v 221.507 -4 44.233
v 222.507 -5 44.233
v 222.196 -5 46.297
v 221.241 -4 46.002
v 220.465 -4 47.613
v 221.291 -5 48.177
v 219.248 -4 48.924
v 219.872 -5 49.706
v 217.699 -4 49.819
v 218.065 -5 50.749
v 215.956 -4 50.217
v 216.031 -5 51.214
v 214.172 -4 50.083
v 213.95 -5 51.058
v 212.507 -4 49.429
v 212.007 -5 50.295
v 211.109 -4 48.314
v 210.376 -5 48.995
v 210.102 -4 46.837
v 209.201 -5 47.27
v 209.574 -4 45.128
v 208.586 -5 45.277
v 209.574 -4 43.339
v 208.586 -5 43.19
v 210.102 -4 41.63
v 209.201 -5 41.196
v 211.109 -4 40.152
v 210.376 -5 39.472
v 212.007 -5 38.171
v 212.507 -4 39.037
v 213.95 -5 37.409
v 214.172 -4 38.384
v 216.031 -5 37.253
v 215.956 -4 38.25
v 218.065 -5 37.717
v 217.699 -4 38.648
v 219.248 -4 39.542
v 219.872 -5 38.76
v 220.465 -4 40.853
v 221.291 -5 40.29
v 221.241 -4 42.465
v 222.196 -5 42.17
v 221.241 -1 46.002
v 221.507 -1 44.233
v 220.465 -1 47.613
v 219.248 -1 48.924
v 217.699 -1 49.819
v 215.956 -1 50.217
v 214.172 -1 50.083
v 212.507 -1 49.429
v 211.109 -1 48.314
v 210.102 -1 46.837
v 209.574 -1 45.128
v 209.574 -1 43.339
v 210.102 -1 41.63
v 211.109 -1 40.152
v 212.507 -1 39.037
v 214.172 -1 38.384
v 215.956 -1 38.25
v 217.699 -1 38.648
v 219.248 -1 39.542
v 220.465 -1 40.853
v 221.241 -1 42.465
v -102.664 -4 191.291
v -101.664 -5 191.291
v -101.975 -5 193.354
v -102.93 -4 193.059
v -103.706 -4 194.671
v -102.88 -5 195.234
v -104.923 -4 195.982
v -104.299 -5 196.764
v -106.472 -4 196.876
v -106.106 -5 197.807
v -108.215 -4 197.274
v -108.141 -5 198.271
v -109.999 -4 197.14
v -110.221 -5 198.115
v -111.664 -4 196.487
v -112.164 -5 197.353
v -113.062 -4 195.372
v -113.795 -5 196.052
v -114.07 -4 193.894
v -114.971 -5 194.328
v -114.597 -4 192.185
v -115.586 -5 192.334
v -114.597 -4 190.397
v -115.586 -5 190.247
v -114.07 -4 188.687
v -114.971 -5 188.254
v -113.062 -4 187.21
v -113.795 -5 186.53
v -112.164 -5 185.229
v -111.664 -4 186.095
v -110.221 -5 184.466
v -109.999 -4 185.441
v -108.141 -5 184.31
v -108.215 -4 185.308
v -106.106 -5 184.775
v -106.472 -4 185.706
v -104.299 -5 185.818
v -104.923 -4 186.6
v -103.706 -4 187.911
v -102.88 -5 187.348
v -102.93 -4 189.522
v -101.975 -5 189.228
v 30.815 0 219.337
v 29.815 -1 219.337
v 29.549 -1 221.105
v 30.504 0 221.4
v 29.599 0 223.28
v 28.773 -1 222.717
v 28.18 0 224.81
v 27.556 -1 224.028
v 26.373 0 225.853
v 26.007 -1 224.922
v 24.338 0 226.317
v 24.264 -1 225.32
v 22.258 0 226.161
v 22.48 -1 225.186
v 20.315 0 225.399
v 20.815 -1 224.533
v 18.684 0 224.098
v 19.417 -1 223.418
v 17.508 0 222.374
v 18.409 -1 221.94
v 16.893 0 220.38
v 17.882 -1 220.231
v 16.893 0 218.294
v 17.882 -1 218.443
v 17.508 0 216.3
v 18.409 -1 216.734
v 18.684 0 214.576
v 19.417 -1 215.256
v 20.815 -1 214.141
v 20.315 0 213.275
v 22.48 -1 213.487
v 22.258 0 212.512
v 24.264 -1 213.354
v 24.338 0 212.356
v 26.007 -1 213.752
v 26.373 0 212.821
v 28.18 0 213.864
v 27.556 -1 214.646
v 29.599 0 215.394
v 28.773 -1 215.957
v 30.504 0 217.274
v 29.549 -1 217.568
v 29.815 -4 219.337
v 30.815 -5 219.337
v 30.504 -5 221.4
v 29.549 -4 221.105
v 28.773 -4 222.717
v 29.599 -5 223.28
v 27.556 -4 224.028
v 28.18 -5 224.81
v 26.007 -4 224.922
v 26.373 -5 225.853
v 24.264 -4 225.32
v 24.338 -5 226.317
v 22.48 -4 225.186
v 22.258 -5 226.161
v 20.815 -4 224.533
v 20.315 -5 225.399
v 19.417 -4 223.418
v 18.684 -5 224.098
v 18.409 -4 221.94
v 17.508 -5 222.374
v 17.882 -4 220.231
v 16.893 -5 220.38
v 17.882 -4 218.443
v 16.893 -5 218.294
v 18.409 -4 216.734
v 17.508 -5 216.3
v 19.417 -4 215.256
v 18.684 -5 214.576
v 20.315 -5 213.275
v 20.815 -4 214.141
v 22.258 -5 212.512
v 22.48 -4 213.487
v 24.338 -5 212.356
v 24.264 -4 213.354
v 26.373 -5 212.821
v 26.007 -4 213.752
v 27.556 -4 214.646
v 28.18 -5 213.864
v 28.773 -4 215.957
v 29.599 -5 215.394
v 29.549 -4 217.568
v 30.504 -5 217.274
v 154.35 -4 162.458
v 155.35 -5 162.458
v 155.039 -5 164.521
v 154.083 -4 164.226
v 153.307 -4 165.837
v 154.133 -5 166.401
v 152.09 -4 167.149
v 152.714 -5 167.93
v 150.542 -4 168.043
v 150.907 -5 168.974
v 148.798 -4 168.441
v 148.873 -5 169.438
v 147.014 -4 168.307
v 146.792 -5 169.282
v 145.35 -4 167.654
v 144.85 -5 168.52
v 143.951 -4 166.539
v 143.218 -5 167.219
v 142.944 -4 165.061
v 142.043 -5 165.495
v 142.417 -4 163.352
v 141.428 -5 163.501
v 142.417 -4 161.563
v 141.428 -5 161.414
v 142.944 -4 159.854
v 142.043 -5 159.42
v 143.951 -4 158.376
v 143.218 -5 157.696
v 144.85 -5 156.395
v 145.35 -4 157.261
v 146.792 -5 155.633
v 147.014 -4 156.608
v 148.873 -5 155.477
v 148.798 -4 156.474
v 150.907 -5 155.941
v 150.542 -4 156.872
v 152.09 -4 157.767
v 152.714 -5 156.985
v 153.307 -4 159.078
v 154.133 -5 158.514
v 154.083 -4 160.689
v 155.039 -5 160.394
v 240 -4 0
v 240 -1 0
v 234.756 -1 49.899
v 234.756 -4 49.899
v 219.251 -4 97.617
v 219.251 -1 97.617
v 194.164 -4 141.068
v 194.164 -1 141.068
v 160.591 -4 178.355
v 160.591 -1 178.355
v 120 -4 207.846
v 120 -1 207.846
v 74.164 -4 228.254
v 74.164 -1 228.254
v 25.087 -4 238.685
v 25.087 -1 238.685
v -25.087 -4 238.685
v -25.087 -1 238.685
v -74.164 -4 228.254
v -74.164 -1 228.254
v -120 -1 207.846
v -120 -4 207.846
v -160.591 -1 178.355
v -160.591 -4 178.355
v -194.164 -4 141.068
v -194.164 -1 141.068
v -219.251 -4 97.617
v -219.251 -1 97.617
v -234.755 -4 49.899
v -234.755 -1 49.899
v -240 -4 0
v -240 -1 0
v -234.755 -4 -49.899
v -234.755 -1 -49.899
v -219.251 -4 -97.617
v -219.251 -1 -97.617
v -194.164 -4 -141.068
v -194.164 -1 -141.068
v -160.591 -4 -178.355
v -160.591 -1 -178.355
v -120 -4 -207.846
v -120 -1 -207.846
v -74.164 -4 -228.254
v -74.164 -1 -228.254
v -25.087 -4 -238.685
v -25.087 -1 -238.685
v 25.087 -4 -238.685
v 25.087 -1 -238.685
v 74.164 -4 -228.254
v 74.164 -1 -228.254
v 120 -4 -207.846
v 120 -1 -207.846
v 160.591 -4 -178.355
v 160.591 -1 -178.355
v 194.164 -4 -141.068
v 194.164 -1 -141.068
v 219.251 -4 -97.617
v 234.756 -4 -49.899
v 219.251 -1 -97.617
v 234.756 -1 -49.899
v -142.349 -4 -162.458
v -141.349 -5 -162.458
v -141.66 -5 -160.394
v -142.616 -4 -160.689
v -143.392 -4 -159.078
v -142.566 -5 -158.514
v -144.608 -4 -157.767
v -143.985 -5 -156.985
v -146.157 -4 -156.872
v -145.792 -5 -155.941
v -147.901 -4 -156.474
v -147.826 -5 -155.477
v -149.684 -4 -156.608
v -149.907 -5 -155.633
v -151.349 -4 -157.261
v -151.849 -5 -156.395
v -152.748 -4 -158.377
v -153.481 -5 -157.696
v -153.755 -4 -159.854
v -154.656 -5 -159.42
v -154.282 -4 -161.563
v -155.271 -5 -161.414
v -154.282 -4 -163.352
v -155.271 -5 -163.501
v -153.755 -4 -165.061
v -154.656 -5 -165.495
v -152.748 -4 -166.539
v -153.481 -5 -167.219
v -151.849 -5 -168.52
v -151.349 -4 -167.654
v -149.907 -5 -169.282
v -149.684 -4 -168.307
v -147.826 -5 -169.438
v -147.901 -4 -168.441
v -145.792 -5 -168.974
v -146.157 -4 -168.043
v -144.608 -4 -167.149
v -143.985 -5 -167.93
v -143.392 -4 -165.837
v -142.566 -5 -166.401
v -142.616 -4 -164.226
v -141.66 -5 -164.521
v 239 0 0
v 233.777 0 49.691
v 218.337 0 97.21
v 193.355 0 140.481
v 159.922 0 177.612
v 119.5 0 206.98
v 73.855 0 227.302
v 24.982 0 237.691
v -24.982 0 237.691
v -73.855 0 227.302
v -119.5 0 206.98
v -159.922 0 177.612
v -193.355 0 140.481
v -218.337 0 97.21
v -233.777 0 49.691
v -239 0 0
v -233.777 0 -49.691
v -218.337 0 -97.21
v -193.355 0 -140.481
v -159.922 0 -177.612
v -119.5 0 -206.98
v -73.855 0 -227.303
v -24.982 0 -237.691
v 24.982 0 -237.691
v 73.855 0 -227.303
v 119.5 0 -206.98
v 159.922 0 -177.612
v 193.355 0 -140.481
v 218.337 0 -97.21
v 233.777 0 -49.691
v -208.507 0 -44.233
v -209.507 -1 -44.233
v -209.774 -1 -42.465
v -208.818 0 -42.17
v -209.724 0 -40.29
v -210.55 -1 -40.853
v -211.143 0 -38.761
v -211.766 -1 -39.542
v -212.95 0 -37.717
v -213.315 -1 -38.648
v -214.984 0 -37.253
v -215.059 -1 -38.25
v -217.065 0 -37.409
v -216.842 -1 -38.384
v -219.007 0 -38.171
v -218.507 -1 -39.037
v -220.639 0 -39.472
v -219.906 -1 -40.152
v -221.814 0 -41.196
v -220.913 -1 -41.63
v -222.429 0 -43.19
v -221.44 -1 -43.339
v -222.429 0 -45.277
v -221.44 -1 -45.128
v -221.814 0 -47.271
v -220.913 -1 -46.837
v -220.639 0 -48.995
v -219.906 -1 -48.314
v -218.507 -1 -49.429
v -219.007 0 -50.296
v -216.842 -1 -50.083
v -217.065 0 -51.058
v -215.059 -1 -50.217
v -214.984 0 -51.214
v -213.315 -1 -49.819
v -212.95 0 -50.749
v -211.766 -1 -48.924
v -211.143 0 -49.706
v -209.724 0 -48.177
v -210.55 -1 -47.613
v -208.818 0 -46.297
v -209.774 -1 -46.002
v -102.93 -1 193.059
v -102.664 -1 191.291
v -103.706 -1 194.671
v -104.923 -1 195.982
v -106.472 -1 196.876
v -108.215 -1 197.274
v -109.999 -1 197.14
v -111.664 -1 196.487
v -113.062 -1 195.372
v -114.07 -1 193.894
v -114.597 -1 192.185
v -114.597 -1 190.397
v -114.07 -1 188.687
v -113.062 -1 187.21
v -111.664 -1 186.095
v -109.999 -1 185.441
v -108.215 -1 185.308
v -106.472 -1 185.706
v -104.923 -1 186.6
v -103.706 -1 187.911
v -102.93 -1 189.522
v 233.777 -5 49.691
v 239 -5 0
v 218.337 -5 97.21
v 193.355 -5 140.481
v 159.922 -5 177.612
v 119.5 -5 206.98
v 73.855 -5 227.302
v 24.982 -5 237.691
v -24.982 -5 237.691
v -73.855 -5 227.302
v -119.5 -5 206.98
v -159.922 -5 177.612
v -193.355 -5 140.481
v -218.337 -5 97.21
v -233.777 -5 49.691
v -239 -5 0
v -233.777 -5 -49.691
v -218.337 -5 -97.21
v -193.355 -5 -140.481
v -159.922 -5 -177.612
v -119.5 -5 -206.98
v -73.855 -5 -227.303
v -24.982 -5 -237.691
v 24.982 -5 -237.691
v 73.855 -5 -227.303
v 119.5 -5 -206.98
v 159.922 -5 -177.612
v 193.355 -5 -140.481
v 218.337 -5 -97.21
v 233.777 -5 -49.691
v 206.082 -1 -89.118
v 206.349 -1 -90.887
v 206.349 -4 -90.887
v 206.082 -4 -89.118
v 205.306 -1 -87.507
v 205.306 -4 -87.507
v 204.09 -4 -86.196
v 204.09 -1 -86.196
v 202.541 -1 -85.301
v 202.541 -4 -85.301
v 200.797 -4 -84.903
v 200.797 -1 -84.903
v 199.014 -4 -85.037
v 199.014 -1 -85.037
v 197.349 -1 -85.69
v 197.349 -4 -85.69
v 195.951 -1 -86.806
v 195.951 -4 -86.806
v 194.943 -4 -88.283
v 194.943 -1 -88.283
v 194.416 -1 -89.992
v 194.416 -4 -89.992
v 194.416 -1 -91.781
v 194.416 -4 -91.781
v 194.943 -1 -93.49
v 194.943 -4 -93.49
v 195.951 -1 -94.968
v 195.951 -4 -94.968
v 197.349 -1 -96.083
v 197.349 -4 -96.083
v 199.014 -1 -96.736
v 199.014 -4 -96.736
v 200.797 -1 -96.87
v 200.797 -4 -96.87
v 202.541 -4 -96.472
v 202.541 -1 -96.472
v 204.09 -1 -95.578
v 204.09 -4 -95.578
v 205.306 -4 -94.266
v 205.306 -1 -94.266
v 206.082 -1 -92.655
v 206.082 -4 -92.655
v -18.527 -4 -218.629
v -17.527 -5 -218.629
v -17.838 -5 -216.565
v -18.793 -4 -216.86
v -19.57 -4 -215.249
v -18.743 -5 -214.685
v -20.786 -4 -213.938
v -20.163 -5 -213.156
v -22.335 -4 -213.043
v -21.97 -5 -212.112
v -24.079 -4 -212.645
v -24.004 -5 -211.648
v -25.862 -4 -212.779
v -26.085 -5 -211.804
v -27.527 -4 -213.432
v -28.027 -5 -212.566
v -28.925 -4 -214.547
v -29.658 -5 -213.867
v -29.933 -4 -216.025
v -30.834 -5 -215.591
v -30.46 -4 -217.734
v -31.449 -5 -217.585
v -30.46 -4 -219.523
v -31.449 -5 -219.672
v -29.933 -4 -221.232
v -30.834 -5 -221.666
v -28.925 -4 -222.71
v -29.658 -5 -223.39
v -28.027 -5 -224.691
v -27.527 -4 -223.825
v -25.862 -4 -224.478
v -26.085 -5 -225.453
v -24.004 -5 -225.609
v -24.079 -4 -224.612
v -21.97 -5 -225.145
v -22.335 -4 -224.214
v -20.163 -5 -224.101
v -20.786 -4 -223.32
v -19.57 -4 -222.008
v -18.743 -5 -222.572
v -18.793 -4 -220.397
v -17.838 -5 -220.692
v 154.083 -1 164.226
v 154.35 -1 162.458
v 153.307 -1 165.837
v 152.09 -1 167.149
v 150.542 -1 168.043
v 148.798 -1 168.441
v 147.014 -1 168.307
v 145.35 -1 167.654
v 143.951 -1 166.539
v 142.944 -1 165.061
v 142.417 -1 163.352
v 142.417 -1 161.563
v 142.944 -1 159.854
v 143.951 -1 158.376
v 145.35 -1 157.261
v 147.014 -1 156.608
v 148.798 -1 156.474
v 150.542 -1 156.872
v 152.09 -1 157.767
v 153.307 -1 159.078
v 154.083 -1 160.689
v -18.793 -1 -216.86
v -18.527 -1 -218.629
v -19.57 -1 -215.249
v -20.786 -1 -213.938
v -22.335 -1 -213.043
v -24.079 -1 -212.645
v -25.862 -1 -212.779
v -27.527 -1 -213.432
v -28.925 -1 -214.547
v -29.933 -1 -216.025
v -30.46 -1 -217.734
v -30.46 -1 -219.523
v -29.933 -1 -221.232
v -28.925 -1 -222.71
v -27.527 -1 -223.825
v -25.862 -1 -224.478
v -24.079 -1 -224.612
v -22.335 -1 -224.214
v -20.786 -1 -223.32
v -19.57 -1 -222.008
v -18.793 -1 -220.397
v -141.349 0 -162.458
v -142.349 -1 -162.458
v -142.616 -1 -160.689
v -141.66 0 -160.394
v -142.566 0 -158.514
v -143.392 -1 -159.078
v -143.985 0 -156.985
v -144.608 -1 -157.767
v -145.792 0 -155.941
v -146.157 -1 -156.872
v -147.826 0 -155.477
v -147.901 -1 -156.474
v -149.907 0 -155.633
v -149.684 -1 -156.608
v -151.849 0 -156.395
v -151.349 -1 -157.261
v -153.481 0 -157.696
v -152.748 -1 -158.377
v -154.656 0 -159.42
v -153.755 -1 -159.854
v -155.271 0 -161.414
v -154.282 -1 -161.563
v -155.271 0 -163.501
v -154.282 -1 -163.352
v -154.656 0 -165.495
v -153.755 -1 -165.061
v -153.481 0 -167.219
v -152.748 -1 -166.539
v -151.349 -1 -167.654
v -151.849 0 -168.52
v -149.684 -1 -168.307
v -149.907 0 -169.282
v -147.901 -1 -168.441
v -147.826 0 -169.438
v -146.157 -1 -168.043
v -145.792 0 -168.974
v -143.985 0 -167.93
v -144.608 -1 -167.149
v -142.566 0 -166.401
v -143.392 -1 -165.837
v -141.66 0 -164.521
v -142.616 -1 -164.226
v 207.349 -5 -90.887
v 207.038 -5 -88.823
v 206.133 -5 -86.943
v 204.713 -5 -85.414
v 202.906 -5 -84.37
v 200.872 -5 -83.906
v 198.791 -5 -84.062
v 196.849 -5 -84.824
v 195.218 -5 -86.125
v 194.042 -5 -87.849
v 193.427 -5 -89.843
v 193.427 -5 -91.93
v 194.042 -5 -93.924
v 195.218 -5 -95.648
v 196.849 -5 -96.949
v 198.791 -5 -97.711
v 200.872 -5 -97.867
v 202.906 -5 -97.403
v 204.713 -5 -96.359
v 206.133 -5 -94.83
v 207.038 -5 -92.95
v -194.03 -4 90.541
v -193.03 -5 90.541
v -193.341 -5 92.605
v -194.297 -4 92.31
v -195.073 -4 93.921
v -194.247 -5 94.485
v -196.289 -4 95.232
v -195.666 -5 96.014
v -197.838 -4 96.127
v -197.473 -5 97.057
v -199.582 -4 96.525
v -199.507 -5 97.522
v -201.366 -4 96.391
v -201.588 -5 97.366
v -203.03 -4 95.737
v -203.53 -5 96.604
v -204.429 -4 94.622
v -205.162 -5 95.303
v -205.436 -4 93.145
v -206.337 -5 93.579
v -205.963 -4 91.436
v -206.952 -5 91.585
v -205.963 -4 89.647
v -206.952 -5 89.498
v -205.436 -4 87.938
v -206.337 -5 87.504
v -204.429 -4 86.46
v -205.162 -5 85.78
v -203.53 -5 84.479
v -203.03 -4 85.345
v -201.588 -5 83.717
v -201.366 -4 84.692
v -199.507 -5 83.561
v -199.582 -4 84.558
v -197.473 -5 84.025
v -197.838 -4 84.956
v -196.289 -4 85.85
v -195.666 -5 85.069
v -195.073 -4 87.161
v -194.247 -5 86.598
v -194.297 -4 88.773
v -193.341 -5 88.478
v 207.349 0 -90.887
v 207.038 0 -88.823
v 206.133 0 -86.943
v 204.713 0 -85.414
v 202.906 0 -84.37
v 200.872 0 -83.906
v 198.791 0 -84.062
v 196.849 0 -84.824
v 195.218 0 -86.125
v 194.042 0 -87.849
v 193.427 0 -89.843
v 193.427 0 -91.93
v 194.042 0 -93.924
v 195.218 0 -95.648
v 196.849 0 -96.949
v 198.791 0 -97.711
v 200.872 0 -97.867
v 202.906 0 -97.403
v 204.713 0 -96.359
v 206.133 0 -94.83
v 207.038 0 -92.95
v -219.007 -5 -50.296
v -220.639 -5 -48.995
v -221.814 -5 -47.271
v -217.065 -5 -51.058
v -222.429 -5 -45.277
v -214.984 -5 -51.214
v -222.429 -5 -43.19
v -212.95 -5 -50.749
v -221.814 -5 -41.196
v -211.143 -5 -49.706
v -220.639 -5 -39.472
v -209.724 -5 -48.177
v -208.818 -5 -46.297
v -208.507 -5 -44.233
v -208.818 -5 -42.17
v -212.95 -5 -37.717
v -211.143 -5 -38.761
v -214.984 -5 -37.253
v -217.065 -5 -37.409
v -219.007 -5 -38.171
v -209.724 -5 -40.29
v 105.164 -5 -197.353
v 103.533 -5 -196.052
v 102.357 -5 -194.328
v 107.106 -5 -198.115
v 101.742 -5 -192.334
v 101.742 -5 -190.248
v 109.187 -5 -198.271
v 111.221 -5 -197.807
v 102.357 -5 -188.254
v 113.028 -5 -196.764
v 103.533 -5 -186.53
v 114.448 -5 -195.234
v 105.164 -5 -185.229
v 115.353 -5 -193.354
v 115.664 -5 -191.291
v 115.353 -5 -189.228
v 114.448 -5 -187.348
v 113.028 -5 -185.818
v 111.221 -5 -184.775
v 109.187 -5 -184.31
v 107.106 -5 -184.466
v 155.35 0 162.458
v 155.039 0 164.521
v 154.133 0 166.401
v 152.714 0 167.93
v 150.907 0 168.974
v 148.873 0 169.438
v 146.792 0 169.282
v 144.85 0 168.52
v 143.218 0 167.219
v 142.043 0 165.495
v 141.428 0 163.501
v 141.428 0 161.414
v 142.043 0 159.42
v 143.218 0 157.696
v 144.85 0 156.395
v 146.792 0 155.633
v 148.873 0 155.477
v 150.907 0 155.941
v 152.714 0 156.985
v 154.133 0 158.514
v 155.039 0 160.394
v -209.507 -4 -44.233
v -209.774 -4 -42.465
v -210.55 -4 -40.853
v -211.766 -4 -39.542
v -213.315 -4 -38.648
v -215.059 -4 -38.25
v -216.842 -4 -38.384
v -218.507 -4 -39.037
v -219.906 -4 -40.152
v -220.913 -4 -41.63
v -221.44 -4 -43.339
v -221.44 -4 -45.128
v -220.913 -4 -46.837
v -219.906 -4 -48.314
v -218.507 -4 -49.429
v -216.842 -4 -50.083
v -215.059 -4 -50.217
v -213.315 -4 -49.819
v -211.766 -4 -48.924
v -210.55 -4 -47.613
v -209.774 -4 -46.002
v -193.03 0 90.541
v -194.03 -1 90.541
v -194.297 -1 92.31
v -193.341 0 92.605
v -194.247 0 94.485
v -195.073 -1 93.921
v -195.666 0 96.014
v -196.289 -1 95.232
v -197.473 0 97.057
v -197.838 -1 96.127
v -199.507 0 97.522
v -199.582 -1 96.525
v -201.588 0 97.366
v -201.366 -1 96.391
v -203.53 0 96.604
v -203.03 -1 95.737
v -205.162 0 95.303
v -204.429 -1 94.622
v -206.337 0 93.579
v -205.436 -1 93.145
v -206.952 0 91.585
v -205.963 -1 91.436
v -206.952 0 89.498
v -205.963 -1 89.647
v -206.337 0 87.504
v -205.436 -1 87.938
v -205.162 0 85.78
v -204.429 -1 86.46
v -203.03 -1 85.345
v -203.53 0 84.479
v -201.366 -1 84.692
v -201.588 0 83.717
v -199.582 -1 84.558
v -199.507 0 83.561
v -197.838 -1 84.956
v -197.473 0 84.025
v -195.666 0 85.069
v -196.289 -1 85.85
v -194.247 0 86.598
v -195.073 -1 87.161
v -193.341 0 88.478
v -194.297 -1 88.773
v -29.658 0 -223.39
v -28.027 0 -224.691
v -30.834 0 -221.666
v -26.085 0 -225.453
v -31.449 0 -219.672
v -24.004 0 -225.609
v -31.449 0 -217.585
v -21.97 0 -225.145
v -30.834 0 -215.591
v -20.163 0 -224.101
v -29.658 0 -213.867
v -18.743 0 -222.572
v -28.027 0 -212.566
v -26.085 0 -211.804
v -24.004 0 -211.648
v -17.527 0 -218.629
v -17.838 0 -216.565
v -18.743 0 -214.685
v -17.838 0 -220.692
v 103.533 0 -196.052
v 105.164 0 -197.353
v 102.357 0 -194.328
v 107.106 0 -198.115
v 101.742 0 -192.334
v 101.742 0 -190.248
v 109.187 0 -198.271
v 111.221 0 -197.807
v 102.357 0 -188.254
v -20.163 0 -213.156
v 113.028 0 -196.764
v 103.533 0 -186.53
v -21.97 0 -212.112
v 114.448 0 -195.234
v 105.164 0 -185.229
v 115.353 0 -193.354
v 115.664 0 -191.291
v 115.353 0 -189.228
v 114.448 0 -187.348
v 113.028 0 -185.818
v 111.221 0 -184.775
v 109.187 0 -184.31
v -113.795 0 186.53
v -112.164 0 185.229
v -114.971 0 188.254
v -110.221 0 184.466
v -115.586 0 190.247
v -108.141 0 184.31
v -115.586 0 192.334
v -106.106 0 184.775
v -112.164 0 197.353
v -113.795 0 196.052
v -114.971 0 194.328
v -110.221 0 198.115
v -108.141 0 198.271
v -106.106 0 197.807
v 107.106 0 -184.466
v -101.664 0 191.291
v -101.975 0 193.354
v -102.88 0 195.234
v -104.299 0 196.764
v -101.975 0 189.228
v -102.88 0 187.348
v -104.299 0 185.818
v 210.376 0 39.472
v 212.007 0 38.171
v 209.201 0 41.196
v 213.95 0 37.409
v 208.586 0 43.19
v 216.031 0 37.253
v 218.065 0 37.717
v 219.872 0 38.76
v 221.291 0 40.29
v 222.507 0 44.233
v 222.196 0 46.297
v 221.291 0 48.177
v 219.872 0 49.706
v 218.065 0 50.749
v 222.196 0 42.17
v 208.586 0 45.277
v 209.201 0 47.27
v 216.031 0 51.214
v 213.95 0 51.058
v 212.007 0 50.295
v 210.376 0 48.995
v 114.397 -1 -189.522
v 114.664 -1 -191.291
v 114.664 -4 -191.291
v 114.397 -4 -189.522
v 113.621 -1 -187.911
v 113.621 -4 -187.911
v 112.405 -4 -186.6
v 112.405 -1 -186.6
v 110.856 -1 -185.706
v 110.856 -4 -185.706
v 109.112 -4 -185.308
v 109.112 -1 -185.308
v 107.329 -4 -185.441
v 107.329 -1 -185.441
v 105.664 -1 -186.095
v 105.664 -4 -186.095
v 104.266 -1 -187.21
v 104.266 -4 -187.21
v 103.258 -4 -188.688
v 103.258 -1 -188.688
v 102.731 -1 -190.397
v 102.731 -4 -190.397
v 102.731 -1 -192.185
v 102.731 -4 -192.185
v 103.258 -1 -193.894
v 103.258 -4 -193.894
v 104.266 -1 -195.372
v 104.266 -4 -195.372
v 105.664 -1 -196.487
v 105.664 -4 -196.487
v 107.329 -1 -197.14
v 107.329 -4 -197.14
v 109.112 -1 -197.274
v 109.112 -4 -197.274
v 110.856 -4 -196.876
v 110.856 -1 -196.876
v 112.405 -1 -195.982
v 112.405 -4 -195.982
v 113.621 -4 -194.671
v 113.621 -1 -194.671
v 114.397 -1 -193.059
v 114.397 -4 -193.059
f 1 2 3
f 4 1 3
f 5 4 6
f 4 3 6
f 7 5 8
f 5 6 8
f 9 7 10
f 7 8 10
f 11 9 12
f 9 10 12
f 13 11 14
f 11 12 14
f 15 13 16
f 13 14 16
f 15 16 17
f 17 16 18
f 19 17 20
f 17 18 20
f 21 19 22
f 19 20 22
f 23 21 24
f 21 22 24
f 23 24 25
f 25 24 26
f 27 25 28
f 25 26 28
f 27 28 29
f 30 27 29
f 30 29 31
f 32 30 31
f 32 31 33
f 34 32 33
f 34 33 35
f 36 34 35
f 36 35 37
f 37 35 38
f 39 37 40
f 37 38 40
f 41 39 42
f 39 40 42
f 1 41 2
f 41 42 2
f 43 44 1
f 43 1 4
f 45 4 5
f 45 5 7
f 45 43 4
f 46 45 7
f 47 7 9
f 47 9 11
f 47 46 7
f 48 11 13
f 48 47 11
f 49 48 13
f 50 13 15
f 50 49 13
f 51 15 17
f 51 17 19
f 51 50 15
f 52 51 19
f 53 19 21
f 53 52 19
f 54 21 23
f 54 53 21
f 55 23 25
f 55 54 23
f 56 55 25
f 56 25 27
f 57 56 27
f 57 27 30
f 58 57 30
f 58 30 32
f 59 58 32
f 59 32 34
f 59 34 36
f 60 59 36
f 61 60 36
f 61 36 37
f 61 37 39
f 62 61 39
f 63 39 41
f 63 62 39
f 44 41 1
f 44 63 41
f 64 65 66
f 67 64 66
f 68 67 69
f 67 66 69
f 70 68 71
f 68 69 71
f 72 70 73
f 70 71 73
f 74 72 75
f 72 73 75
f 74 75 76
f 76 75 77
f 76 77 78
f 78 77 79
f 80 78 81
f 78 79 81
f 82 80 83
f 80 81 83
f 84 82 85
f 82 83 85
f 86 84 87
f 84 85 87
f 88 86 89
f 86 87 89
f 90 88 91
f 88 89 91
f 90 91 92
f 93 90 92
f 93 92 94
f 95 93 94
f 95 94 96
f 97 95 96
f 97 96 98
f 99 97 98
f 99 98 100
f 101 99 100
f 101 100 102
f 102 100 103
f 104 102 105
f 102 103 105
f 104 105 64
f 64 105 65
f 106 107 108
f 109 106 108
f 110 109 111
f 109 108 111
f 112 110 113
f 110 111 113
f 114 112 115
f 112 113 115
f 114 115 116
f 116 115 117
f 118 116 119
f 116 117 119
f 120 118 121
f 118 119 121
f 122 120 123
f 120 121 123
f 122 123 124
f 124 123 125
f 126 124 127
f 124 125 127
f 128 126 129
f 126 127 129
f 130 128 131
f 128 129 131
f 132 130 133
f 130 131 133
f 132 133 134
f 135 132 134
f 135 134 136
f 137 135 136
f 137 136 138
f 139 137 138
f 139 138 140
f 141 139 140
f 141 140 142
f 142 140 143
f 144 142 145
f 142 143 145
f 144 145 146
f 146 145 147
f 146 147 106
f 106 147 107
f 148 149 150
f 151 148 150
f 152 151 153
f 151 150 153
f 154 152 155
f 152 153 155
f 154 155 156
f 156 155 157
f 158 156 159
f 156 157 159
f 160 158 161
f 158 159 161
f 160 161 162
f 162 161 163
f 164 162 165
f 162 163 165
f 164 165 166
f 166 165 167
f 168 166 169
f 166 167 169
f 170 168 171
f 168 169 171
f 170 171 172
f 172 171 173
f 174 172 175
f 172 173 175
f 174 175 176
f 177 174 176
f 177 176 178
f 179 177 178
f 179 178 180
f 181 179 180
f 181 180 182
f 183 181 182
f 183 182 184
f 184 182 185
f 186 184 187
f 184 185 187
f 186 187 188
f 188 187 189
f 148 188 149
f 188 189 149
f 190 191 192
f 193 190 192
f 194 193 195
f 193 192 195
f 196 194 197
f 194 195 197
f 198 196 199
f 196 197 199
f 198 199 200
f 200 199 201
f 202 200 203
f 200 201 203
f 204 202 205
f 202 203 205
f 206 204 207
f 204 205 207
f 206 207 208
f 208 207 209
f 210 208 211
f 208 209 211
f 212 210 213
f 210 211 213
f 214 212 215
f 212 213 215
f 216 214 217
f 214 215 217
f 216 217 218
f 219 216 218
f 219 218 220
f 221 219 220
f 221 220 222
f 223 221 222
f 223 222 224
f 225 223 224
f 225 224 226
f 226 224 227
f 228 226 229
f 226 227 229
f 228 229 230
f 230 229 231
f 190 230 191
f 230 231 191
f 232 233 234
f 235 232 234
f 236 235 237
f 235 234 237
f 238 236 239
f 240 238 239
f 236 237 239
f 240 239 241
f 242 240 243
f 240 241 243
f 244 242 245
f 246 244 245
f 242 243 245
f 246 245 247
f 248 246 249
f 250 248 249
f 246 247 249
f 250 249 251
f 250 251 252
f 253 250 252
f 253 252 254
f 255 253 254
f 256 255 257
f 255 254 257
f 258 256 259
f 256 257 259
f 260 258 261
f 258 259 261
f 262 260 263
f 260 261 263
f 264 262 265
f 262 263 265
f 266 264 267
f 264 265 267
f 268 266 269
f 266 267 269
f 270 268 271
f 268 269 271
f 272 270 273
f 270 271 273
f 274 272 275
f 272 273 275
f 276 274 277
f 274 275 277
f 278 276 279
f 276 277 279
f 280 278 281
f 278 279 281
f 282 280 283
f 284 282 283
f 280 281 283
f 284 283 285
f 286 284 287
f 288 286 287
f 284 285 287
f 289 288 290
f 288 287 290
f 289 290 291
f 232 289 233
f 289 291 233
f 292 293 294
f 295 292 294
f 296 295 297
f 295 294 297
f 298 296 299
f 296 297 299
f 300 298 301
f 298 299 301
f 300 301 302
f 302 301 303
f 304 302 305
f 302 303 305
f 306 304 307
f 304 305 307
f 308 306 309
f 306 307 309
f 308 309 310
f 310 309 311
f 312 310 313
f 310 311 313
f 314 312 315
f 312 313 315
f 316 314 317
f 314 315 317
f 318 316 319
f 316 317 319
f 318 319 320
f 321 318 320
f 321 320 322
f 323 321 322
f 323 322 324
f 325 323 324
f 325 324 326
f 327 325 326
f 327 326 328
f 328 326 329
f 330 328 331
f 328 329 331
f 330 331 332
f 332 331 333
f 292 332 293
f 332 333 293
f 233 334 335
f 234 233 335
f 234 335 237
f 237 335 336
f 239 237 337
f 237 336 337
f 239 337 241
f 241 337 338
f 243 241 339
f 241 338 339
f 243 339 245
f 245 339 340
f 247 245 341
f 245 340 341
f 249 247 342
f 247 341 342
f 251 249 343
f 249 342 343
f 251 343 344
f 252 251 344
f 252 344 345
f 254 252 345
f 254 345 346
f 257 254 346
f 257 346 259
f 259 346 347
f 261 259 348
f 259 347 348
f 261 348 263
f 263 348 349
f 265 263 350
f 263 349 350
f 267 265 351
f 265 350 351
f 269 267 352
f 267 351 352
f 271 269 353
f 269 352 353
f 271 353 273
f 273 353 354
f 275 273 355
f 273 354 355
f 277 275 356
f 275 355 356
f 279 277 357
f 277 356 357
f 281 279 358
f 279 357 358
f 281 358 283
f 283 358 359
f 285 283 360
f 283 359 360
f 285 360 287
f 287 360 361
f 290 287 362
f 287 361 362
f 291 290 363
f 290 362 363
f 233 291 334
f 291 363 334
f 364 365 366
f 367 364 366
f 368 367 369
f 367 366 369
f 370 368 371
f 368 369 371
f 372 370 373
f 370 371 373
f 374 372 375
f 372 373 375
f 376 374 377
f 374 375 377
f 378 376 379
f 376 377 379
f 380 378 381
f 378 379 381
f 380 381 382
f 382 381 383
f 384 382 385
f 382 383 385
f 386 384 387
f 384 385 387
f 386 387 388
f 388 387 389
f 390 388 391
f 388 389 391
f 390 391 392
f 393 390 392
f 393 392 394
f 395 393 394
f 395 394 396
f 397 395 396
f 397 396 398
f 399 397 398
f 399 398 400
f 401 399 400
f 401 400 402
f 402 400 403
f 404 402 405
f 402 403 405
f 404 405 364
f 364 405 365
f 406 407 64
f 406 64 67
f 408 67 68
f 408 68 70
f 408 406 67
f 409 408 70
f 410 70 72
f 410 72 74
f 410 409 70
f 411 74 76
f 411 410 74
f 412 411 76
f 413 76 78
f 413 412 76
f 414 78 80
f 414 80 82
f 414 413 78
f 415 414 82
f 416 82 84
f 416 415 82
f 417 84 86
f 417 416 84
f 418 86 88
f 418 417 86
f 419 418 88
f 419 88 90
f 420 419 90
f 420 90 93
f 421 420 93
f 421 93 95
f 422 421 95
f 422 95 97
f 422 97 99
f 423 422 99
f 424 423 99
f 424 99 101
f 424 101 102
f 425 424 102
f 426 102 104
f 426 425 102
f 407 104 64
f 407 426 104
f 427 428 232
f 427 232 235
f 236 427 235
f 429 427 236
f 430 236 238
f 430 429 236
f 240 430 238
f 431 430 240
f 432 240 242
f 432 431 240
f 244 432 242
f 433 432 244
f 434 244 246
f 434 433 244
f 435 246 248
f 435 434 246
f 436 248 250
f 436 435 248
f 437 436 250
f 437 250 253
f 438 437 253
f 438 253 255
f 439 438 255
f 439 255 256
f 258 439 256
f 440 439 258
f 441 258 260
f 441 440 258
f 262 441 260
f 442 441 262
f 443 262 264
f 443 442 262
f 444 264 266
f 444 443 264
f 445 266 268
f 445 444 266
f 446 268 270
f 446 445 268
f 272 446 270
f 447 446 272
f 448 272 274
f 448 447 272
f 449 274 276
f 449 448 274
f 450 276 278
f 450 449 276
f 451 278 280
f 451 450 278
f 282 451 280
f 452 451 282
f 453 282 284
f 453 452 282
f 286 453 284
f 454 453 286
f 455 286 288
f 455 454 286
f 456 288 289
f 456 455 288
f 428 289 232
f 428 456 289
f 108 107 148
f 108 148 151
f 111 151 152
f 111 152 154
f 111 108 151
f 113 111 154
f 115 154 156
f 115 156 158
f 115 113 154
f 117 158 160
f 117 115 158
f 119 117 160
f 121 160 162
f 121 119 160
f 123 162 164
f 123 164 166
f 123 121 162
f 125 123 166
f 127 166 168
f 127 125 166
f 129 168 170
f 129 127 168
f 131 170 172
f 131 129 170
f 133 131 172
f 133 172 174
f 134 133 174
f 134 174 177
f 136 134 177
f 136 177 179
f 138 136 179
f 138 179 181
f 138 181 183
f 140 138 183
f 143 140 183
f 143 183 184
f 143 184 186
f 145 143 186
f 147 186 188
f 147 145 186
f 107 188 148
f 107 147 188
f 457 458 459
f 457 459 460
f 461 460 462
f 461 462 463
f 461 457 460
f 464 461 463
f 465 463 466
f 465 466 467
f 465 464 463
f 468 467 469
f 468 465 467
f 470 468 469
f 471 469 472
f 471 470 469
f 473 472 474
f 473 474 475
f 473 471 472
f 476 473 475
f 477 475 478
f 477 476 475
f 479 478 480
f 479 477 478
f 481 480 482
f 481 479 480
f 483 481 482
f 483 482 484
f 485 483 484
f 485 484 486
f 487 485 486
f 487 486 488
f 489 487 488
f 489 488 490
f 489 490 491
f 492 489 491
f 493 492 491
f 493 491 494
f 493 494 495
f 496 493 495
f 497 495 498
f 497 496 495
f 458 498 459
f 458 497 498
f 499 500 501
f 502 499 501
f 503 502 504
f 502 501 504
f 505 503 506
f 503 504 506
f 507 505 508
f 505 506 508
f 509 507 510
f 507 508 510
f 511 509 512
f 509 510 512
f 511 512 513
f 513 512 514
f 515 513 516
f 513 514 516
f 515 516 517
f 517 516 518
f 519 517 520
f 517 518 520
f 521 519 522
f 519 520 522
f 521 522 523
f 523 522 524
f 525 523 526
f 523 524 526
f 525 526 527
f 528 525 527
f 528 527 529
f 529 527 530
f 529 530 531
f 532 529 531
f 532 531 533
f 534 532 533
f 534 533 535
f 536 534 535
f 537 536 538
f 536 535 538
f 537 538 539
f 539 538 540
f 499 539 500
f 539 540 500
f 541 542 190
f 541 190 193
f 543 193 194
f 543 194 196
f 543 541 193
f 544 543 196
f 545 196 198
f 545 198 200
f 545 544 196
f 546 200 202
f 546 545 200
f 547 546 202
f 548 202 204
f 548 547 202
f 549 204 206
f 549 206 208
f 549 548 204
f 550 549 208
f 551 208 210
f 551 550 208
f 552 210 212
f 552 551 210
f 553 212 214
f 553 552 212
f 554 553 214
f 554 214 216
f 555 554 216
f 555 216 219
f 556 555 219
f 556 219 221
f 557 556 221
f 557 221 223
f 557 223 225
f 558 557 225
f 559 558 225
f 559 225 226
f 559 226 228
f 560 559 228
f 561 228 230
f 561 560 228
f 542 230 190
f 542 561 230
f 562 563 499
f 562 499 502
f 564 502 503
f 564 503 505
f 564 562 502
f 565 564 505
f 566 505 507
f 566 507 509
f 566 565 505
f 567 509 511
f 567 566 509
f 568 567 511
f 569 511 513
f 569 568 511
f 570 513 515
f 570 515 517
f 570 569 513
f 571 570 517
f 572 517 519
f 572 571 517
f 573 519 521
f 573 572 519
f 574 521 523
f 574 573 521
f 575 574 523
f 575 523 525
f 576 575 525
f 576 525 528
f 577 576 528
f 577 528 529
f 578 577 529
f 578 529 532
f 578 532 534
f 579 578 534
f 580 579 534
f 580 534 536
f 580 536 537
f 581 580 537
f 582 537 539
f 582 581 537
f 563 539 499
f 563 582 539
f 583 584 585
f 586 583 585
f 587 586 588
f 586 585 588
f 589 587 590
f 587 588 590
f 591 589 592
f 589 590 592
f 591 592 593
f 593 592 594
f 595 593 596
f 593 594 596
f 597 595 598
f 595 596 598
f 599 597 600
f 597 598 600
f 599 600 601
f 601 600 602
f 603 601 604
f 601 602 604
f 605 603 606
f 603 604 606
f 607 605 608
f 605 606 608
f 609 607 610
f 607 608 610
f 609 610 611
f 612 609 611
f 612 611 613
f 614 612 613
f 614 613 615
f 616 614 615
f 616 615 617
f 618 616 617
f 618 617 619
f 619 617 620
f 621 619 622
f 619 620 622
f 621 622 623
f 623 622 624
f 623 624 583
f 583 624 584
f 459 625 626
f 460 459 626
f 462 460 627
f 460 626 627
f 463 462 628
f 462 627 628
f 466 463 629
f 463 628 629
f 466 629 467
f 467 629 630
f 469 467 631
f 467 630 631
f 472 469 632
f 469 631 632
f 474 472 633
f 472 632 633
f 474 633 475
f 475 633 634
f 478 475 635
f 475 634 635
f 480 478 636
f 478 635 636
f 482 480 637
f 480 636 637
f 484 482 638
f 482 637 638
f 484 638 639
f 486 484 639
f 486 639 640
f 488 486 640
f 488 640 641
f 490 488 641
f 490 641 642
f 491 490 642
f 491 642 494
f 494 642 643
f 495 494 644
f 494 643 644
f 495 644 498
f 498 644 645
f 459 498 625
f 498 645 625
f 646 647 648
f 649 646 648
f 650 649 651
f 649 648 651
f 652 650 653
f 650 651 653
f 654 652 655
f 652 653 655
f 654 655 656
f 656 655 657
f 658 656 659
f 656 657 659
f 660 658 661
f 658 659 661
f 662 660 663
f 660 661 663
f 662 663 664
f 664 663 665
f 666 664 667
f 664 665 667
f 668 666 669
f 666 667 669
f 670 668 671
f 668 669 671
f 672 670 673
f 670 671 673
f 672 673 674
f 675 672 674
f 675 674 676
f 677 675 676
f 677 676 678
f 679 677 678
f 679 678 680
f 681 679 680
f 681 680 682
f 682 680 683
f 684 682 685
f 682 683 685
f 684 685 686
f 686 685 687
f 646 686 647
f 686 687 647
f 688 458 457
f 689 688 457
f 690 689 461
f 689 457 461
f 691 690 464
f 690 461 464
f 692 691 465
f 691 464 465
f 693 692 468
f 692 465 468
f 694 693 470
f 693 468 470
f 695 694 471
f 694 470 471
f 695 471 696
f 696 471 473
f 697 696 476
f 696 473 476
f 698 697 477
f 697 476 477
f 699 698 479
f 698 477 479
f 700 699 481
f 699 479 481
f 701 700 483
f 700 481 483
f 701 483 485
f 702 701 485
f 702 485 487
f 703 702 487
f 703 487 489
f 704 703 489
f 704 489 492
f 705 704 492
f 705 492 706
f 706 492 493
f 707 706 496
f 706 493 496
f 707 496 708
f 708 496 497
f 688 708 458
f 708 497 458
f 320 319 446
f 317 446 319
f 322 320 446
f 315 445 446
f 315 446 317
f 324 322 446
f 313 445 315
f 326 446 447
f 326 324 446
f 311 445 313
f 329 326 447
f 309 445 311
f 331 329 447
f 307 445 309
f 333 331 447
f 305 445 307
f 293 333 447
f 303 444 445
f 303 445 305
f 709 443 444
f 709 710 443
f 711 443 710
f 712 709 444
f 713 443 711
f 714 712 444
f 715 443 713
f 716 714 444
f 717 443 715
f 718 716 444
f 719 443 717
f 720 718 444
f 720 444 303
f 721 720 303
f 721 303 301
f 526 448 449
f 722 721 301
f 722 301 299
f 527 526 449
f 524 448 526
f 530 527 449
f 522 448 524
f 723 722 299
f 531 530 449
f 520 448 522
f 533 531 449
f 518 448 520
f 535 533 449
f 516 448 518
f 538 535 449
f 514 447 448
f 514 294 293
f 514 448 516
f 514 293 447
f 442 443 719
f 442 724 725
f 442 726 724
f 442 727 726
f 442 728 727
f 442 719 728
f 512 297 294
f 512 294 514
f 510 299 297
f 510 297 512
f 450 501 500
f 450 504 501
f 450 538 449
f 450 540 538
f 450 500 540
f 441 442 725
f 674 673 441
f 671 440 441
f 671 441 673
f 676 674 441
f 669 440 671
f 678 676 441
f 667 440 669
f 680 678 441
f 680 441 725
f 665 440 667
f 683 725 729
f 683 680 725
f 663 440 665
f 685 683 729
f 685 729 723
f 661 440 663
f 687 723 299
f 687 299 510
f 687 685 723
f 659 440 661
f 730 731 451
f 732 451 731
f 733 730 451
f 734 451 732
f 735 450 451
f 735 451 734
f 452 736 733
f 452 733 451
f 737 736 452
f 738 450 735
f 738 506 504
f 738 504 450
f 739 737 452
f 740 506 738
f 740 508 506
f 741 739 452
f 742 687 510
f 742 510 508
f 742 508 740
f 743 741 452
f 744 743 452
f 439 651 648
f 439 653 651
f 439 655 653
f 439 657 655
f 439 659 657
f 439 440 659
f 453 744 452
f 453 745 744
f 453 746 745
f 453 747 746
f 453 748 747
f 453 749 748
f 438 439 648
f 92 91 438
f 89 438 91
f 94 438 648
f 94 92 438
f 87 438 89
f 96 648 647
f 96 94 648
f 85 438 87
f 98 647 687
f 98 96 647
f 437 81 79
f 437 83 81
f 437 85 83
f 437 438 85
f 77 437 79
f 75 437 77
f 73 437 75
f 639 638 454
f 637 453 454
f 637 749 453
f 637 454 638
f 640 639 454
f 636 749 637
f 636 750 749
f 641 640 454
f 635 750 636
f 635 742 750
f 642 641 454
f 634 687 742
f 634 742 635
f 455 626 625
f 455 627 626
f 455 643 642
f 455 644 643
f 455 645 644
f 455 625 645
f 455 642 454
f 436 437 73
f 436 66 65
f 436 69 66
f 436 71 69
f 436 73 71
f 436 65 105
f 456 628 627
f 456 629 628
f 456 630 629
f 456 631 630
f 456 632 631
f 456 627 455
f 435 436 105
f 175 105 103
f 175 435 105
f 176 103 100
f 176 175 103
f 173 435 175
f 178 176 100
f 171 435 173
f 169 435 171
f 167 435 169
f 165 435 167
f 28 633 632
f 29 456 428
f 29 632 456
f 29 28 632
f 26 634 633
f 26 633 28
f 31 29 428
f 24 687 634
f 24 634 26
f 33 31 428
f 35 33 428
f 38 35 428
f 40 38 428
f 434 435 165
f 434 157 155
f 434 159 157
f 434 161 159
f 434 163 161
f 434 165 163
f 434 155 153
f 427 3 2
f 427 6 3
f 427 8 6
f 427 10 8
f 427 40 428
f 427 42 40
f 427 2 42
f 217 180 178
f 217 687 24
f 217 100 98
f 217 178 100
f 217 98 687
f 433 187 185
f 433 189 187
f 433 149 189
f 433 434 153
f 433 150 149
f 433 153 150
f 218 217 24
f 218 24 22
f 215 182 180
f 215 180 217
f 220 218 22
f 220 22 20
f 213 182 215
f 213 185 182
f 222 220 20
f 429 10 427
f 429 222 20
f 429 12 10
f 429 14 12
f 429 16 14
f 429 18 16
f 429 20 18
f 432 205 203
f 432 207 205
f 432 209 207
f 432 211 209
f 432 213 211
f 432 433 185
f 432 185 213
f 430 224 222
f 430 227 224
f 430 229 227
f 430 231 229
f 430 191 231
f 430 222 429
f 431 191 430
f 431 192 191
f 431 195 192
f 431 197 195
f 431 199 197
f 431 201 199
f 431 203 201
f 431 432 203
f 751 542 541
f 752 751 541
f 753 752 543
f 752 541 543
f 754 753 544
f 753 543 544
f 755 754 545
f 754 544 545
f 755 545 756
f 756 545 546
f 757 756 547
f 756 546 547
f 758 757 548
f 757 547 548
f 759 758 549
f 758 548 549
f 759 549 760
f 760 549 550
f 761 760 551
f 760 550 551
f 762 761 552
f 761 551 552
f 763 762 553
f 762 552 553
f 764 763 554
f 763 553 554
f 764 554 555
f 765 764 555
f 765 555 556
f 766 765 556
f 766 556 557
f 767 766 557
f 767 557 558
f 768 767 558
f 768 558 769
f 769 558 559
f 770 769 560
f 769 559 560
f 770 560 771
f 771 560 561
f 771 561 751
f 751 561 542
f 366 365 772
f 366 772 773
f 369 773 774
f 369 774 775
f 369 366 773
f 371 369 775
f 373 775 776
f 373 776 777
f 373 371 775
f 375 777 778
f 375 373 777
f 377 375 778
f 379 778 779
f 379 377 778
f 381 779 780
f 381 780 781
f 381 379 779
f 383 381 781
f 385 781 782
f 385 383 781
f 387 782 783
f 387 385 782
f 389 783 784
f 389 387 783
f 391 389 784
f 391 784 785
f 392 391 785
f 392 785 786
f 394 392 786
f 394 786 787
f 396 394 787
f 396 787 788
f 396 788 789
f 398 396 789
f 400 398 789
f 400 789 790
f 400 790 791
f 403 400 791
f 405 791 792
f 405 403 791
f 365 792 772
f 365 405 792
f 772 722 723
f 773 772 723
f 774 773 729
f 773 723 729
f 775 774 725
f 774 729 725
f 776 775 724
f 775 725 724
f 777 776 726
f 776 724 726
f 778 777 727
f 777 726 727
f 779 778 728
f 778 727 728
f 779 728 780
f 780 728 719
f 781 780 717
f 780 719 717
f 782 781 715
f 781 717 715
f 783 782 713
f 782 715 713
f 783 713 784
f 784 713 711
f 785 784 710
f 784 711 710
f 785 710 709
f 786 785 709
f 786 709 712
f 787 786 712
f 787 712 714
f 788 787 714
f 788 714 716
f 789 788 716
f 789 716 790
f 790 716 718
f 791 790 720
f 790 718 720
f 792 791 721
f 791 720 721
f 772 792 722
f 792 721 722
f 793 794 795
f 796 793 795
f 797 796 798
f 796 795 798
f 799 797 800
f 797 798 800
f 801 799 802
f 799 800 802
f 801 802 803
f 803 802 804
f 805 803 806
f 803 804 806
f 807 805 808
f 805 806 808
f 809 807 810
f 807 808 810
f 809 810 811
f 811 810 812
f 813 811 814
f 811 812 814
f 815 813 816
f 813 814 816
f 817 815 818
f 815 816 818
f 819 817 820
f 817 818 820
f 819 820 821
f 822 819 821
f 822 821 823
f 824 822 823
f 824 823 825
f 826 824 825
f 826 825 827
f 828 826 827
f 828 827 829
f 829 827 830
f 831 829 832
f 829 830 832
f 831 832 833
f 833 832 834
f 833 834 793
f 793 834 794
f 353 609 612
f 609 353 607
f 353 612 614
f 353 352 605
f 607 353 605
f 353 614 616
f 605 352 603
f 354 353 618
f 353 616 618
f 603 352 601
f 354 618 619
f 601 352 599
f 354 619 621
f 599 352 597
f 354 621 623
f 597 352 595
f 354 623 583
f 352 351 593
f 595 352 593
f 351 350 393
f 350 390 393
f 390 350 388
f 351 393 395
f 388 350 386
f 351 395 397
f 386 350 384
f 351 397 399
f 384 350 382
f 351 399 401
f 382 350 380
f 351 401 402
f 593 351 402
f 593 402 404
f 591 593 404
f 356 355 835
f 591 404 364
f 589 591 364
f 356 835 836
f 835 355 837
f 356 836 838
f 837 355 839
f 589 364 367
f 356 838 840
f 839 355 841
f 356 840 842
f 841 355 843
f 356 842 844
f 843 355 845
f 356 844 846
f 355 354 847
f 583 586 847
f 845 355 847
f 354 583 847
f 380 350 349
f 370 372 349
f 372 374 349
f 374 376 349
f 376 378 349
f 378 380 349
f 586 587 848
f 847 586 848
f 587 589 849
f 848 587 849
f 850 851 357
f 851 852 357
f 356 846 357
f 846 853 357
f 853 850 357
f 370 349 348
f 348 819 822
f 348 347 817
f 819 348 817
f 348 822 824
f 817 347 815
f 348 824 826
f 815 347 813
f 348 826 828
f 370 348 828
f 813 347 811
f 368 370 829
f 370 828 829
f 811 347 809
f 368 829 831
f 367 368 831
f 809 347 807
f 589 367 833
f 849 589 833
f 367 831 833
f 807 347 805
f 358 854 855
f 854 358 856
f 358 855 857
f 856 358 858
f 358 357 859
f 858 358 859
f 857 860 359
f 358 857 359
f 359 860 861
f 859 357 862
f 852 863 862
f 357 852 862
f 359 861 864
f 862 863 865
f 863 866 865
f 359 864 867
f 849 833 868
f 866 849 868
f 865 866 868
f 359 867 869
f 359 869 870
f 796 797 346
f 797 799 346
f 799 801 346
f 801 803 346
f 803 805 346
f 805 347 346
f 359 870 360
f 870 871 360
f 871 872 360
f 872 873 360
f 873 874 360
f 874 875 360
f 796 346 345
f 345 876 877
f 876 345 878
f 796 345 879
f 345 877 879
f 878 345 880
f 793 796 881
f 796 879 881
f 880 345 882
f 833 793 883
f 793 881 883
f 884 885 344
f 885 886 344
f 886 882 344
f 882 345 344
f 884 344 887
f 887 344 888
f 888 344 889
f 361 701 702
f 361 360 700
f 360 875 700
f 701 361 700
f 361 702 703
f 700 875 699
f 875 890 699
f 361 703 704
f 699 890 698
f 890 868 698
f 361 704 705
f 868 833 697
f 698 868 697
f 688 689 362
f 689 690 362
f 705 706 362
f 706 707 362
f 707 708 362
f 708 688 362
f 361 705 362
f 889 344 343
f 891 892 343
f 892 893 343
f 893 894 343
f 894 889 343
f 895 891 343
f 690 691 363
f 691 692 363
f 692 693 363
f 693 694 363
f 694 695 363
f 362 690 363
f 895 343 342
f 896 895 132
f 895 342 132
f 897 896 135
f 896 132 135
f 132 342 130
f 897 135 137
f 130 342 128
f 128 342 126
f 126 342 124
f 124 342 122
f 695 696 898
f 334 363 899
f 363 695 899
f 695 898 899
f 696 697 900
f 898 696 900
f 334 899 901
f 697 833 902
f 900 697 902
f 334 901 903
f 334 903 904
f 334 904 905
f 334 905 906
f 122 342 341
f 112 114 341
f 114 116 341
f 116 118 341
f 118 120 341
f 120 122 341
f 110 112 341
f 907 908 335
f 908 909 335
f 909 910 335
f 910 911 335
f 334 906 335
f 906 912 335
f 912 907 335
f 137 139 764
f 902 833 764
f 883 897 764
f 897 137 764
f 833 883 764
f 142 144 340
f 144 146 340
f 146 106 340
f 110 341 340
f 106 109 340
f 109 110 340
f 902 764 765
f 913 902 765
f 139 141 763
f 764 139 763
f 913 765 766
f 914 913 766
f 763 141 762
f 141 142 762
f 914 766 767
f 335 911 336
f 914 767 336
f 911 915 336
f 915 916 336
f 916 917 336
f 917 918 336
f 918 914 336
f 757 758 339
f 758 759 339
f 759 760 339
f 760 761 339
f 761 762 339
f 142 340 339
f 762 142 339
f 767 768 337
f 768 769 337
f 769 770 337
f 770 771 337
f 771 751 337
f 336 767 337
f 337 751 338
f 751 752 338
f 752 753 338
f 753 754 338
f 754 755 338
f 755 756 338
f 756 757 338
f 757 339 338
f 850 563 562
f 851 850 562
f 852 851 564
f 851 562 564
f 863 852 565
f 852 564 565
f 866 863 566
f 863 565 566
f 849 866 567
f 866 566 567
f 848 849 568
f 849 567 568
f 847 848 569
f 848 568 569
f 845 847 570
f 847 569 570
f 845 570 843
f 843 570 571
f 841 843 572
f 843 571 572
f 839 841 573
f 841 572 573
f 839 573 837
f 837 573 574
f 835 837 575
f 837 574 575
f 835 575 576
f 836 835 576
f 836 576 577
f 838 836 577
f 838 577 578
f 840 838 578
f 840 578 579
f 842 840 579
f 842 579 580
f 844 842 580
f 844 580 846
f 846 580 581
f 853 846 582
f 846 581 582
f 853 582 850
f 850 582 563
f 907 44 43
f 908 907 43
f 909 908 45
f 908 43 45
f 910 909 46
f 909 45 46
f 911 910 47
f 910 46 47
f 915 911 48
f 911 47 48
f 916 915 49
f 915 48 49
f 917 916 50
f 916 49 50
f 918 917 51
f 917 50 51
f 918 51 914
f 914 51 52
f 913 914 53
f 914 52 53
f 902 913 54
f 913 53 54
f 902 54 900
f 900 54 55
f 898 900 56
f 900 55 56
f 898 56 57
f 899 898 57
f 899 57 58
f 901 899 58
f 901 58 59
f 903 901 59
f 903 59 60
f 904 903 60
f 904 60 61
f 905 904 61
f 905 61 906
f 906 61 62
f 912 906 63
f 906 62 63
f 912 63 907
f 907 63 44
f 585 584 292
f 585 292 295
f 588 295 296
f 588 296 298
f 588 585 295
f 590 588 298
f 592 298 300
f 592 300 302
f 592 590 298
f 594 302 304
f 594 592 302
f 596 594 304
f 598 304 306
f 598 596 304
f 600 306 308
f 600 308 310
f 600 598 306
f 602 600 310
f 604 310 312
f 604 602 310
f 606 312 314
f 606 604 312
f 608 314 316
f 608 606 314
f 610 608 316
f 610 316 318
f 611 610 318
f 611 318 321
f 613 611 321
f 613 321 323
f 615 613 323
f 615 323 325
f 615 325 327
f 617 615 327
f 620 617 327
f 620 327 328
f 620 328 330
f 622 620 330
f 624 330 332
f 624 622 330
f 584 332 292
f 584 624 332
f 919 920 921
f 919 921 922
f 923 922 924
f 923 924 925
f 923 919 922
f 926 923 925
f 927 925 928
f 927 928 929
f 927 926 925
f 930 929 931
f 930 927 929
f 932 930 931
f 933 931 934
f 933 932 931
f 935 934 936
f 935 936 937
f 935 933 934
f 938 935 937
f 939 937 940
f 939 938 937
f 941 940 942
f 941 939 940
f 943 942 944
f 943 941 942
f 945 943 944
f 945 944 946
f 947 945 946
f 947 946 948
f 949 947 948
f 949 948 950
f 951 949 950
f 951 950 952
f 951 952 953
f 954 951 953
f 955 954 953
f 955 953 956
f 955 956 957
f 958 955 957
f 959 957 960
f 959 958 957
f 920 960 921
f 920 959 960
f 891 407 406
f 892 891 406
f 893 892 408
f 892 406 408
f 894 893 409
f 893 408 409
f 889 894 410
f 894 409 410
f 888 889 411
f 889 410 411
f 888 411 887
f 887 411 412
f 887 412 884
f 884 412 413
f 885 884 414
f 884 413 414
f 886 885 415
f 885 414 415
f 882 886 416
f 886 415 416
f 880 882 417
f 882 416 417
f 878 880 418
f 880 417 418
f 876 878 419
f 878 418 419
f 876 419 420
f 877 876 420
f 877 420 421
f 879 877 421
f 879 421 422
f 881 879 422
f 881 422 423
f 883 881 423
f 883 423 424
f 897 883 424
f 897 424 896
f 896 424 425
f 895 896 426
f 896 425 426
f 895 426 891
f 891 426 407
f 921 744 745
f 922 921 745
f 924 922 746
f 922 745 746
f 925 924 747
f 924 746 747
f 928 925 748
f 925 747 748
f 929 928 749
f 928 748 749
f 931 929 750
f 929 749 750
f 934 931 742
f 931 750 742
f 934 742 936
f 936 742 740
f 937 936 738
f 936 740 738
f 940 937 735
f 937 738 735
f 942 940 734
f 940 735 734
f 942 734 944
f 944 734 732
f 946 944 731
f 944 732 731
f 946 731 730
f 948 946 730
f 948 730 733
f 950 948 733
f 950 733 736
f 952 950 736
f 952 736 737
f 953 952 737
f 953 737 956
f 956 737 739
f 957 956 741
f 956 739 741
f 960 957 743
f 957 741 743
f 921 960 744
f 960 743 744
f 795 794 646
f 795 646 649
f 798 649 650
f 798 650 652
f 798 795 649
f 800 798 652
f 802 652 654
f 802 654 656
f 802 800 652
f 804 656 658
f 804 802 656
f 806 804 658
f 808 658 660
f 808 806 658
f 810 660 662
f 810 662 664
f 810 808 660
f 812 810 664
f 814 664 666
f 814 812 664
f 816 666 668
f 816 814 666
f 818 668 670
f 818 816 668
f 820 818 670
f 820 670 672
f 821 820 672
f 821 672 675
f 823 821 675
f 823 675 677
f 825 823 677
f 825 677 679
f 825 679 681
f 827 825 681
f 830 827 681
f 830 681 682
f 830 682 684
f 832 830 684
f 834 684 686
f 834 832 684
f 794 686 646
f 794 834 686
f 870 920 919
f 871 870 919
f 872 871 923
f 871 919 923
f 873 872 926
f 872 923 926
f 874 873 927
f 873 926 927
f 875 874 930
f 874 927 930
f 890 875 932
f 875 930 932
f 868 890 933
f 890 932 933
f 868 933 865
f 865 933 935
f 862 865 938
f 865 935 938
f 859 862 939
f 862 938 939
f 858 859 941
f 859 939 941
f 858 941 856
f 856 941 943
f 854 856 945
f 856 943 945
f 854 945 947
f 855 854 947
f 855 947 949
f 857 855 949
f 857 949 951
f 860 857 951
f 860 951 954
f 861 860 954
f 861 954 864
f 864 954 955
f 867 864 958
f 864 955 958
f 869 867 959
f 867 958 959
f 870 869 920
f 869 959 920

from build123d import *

# Parameters (mm, degrees)
F0_R     = 240
F0_R_2   = 6
F1_DEPTH = 5
F2_SIZE  = 1
F3_SIZE  = 1


with BuildPart() as f1:
    # F0 (on Front) → F1 (new body)
    with BuildSketch(Plane.XZ):
        with Locations((9.9e-05, -1.9e-05)):
            Circle(F0_R)
        with Locations((-148.349302, -162.457568)):
            Circle(F0_R_2, mode=Mode.SUBTRACT)
        with Locations((-24.526936, -218.628527)):
            Circle(F0_R_2, mode=Mode.SUBTRACT)
        with Locations((-215.507239, -44.233347)):
            Circle(F0_R_2, mode=Mode.SUBTRACT)
        with Locations((108.663924, -191.290827)):
            Circle(F0_R_2, mode=Mode.SUBTRACT)
        with Locations((200.348896, -90.88654)):
            Circle(F0_R_2, mode=Mode.SUBTRACT)
        with Locations((-200.030377, 90.541344)):
            Circle(F0_R_2, mode=Mode.SUBTRACT)
        with Locations((-108.663725, 191.290789)):
            Circle(F0_R_2, mode=Mode.SUBTRACT)
        with Locations((215.507437, 44.233309)):
            Circle(F0_R_2, mode=Mode.SUBTRACT)
        with Locations((23.815236, 219.336878)):
            Circle(F0_R_2, mode=Mode.SUBTRACT)
        with Locations((148.3495, 162.45753)):
            Circle(F0_R_2, mode=Mode.SUBTRACT)
    extrude(amount=F1_DEPTH)

    # F2
    f2_edges = [f1.edges().sort_by_distance(p)[0] for p in [
        (-239.999901, -5, -1.9e-05),
        (-154.349302, -5, -162.457568),
        (-30.526936, -5, -218.628527),
        (-221.507239, -5, -44.233347),
        (102.663924, -5, -191.290827),
        (194.348896, -5, -90.88654),
        (-206.030377, -5, 90.541344),
        (-114.663725, -5, 191.290789),
        (209.507437, -5, 44.233309),
        (17.815236, -5, 219.336878),
        (142.3495, -5, 162.45753),
    ]]
    chamfer(f2_edges, length=F2_SIZE)

    # F3
    f3_edges = [f1.edges().sort_by_distance(p)[0] for p in [
        (-239.999901, 0, -1.9e-05),
        (-154.349302, 0, -162.457568),
        (-30.526936, 0, -218.628527),
        (-221.507239, 0, -44.233347),
        (102.663924, 0, -191.290827),
        (194.348896, 0, -90.88654),
        (-206.030377, 0, 90.541344),
        (-114.663725, 0, 191.290789),
        (209.507437, 0, 44.233309),
        (17.815236, 0, 219.336878),
        (142.3495, 0, 162.45753),
    ]]
    chamfer(f3_edges, length=F3_SIZE)


solid = f1.part
